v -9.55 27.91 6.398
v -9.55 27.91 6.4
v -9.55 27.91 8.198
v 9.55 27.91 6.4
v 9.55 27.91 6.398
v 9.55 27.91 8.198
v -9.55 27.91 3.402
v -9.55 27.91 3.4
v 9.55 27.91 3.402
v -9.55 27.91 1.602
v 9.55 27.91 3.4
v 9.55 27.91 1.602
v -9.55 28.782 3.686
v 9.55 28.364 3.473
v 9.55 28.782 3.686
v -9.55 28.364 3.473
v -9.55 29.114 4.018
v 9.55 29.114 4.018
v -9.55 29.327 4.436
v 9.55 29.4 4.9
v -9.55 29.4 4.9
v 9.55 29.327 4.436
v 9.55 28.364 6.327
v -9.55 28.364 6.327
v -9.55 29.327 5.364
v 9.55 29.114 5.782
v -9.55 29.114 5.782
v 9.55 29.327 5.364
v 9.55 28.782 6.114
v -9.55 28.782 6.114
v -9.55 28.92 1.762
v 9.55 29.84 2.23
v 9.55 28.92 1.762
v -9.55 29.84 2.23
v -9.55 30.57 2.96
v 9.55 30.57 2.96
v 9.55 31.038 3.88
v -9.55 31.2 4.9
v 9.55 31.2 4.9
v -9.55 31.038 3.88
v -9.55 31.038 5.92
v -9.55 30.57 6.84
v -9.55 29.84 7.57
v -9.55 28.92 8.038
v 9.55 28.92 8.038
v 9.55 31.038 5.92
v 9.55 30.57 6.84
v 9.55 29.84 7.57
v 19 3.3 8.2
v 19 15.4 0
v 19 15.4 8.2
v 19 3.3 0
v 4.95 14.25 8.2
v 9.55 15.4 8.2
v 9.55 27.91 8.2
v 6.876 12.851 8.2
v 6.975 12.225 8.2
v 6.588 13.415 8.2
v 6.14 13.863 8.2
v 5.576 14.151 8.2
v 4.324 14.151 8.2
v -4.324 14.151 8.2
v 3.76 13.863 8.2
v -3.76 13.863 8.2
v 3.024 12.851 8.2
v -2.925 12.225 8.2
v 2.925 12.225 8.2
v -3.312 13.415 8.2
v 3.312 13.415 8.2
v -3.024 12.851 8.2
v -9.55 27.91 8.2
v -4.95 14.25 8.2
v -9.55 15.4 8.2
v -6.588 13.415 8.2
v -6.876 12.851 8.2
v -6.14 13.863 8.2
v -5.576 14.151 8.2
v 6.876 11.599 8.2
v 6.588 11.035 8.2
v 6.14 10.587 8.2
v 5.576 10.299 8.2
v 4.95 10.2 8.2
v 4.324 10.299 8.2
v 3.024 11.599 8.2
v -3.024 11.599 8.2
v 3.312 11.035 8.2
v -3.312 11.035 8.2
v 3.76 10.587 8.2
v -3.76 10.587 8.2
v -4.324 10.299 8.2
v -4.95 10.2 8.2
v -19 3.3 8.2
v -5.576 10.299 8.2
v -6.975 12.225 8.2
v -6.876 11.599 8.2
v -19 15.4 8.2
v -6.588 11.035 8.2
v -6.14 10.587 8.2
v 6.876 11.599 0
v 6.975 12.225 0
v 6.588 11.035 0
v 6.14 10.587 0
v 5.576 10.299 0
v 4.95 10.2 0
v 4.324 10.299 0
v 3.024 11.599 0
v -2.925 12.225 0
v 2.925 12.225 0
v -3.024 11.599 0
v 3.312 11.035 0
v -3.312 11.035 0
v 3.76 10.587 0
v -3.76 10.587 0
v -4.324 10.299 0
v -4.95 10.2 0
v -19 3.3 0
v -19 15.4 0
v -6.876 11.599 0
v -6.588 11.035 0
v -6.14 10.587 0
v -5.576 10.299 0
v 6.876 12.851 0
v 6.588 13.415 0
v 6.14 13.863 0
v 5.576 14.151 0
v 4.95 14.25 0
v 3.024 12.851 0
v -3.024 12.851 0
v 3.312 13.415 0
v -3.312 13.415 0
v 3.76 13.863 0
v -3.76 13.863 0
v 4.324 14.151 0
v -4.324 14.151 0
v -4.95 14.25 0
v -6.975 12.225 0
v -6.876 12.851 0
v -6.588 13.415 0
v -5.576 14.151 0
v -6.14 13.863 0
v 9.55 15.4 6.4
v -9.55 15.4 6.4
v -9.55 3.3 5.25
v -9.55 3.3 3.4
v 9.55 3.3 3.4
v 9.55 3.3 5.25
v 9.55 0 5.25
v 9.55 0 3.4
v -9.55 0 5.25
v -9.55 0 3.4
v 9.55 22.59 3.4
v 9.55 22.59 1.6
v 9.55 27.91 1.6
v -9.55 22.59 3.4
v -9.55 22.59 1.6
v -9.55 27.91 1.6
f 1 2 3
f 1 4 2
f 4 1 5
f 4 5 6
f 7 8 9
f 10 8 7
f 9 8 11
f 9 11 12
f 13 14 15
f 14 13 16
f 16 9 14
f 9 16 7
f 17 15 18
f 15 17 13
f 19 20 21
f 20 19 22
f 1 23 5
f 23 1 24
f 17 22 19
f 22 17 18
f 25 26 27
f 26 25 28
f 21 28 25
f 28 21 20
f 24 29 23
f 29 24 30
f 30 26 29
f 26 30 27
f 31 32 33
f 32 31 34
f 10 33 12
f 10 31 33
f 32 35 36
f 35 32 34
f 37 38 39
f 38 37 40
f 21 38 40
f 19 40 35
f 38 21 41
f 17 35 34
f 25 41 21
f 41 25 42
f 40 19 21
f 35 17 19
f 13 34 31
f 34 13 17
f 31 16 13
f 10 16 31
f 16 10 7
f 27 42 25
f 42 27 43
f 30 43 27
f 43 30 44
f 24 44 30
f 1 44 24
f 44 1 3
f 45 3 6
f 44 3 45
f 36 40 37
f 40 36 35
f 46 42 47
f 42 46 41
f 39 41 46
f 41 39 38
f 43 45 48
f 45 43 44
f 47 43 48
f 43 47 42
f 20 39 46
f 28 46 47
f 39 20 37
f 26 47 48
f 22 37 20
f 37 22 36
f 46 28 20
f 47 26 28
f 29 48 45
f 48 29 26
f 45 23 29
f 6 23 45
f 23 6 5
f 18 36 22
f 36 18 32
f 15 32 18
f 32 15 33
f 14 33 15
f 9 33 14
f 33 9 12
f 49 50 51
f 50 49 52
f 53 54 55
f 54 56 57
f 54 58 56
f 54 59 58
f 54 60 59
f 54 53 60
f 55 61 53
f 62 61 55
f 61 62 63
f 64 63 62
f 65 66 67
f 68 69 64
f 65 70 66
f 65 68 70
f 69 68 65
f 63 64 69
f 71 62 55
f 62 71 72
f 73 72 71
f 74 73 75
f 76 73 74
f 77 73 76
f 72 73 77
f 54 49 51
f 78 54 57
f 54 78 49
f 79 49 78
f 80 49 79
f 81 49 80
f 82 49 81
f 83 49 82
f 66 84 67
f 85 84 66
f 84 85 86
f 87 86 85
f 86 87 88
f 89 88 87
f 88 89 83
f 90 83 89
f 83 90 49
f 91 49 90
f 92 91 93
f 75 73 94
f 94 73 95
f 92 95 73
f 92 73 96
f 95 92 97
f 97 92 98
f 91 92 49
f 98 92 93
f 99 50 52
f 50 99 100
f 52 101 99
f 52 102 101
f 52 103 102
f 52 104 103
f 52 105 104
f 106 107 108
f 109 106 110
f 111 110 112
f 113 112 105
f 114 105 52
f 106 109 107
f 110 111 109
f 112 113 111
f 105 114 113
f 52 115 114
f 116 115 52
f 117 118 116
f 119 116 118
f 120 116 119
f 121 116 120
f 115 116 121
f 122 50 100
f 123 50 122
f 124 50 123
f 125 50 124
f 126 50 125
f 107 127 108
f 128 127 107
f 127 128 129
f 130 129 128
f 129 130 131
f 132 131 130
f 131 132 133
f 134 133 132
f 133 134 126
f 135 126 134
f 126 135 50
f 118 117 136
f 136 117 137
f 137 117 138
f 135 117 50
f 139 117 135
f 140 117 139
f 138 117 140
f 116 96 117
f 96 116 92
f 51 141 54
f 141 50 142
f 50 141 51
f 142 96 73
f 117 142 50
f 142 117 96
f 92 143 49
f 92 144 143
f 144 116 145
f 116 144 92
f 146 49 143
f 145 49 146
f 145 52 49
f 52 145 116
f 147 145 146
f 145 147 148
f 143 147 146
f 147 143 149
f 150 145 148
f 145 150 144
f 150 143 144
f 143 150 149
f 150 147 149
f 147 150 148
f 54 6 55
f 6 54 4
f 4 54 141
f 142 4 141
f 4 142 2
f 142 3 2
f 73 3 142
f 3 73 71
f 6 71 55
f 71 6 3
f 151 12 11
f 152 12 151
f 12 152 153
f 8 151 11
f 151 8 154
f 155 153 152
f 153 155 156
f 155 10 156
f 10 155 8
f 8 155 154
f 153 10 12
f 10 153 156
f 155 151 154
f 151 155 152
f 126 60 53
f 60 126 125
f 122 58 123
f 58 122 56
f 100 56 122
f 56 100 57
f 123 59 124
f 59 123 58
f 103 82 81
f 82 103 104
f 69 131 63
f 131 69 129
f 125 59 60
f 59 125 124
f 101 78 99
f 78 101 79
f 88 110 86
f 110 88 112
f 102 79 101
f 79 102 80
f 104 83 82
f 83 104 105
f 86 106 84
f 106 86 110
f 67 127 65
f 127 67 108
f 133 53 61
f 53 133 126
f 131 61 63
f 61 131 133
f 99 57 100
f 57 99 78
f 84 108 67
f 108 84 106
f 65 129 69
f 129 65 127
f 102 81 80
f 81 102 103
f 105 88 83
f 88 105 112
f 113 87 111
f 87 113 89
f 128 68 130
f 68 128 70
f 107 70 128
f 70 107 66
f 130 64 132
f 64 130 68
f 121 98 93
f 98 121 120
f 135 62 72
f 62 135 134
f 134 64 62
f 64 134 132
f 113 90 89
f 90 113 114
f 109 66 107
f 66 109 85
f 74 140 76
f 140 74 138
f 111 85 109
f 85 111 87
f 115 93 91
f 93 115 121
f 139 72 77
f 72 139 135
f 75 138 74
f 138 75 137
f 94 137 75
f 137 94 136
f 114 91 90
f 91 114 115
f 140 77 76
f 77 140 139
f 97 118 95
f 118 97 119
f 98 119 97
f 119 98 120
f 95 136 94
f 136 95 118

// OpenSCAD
EPS = 0.01;

difference() {
    union() {
        // Main structural block
        translate([-38.0*.5, 3.3, 0.0])
        cube([38.0, (15.4 - 3.3), 8.2]);

        // Little tab at the back
        translate([-19.1*.5, 0.0, 3.4])
        cube([19.1, 3.3+EPS, 1.85]);
        
        R_END_OUTER = (0.5*3. + 1.8);
        // Top surface
        translate([-19.1*.5, 15.4-EPS, 8.2-1.8])
        cube([19.1, 15.8 - R_END_OUTER + 2*EPS, 1.8]);
        // Lower surface
        translate([-19.1*.5, 15.4-EPS + 15.8 - 5.3 - R_END_OUTER, 8.2-2.*1.8 - 3.])
        cube([19.1, 5.3 + 2*EPS, 1.8]);
        // Rounded end
        translate([-.5*19.1, 15.4 + 15.8 -R_END_OUTER, 8.2 - R_END_OUTER]) // FIXME
        rotate([0.0, 90.0, 0.0])
        difference() {
            cylinder(r=R_END_OUTER, h=19.1, $fn=20);
            union() {
                translate([-R_END_OUTER, -R_END_OUTER, -EPS])
                cube([2.*R_END_OUTER, R_END_OUTER + EPS, 19.1+2*EPS]);
                translate([0.0, 0.0, -EPS])
                cylinder(r=.5*3., h=19.1+2.*EPS, $fn=20);
            }
        }
    }
    union() {
        // Drill holes
        translate([4.05*.5 + 5.85*.5, 4.05*.5+10.2, -EPS])
        cylinder(r=4.05*.5, h=8.2+2.0*EPS, $fn=20);
        translate([-4.05*.5 - 5.85*.5, 4.05*.5+10.2, -EPS])
        cylinder(r=4.05*.5, h=8.2+2.0*EPS, $fn=20);
    }
}
